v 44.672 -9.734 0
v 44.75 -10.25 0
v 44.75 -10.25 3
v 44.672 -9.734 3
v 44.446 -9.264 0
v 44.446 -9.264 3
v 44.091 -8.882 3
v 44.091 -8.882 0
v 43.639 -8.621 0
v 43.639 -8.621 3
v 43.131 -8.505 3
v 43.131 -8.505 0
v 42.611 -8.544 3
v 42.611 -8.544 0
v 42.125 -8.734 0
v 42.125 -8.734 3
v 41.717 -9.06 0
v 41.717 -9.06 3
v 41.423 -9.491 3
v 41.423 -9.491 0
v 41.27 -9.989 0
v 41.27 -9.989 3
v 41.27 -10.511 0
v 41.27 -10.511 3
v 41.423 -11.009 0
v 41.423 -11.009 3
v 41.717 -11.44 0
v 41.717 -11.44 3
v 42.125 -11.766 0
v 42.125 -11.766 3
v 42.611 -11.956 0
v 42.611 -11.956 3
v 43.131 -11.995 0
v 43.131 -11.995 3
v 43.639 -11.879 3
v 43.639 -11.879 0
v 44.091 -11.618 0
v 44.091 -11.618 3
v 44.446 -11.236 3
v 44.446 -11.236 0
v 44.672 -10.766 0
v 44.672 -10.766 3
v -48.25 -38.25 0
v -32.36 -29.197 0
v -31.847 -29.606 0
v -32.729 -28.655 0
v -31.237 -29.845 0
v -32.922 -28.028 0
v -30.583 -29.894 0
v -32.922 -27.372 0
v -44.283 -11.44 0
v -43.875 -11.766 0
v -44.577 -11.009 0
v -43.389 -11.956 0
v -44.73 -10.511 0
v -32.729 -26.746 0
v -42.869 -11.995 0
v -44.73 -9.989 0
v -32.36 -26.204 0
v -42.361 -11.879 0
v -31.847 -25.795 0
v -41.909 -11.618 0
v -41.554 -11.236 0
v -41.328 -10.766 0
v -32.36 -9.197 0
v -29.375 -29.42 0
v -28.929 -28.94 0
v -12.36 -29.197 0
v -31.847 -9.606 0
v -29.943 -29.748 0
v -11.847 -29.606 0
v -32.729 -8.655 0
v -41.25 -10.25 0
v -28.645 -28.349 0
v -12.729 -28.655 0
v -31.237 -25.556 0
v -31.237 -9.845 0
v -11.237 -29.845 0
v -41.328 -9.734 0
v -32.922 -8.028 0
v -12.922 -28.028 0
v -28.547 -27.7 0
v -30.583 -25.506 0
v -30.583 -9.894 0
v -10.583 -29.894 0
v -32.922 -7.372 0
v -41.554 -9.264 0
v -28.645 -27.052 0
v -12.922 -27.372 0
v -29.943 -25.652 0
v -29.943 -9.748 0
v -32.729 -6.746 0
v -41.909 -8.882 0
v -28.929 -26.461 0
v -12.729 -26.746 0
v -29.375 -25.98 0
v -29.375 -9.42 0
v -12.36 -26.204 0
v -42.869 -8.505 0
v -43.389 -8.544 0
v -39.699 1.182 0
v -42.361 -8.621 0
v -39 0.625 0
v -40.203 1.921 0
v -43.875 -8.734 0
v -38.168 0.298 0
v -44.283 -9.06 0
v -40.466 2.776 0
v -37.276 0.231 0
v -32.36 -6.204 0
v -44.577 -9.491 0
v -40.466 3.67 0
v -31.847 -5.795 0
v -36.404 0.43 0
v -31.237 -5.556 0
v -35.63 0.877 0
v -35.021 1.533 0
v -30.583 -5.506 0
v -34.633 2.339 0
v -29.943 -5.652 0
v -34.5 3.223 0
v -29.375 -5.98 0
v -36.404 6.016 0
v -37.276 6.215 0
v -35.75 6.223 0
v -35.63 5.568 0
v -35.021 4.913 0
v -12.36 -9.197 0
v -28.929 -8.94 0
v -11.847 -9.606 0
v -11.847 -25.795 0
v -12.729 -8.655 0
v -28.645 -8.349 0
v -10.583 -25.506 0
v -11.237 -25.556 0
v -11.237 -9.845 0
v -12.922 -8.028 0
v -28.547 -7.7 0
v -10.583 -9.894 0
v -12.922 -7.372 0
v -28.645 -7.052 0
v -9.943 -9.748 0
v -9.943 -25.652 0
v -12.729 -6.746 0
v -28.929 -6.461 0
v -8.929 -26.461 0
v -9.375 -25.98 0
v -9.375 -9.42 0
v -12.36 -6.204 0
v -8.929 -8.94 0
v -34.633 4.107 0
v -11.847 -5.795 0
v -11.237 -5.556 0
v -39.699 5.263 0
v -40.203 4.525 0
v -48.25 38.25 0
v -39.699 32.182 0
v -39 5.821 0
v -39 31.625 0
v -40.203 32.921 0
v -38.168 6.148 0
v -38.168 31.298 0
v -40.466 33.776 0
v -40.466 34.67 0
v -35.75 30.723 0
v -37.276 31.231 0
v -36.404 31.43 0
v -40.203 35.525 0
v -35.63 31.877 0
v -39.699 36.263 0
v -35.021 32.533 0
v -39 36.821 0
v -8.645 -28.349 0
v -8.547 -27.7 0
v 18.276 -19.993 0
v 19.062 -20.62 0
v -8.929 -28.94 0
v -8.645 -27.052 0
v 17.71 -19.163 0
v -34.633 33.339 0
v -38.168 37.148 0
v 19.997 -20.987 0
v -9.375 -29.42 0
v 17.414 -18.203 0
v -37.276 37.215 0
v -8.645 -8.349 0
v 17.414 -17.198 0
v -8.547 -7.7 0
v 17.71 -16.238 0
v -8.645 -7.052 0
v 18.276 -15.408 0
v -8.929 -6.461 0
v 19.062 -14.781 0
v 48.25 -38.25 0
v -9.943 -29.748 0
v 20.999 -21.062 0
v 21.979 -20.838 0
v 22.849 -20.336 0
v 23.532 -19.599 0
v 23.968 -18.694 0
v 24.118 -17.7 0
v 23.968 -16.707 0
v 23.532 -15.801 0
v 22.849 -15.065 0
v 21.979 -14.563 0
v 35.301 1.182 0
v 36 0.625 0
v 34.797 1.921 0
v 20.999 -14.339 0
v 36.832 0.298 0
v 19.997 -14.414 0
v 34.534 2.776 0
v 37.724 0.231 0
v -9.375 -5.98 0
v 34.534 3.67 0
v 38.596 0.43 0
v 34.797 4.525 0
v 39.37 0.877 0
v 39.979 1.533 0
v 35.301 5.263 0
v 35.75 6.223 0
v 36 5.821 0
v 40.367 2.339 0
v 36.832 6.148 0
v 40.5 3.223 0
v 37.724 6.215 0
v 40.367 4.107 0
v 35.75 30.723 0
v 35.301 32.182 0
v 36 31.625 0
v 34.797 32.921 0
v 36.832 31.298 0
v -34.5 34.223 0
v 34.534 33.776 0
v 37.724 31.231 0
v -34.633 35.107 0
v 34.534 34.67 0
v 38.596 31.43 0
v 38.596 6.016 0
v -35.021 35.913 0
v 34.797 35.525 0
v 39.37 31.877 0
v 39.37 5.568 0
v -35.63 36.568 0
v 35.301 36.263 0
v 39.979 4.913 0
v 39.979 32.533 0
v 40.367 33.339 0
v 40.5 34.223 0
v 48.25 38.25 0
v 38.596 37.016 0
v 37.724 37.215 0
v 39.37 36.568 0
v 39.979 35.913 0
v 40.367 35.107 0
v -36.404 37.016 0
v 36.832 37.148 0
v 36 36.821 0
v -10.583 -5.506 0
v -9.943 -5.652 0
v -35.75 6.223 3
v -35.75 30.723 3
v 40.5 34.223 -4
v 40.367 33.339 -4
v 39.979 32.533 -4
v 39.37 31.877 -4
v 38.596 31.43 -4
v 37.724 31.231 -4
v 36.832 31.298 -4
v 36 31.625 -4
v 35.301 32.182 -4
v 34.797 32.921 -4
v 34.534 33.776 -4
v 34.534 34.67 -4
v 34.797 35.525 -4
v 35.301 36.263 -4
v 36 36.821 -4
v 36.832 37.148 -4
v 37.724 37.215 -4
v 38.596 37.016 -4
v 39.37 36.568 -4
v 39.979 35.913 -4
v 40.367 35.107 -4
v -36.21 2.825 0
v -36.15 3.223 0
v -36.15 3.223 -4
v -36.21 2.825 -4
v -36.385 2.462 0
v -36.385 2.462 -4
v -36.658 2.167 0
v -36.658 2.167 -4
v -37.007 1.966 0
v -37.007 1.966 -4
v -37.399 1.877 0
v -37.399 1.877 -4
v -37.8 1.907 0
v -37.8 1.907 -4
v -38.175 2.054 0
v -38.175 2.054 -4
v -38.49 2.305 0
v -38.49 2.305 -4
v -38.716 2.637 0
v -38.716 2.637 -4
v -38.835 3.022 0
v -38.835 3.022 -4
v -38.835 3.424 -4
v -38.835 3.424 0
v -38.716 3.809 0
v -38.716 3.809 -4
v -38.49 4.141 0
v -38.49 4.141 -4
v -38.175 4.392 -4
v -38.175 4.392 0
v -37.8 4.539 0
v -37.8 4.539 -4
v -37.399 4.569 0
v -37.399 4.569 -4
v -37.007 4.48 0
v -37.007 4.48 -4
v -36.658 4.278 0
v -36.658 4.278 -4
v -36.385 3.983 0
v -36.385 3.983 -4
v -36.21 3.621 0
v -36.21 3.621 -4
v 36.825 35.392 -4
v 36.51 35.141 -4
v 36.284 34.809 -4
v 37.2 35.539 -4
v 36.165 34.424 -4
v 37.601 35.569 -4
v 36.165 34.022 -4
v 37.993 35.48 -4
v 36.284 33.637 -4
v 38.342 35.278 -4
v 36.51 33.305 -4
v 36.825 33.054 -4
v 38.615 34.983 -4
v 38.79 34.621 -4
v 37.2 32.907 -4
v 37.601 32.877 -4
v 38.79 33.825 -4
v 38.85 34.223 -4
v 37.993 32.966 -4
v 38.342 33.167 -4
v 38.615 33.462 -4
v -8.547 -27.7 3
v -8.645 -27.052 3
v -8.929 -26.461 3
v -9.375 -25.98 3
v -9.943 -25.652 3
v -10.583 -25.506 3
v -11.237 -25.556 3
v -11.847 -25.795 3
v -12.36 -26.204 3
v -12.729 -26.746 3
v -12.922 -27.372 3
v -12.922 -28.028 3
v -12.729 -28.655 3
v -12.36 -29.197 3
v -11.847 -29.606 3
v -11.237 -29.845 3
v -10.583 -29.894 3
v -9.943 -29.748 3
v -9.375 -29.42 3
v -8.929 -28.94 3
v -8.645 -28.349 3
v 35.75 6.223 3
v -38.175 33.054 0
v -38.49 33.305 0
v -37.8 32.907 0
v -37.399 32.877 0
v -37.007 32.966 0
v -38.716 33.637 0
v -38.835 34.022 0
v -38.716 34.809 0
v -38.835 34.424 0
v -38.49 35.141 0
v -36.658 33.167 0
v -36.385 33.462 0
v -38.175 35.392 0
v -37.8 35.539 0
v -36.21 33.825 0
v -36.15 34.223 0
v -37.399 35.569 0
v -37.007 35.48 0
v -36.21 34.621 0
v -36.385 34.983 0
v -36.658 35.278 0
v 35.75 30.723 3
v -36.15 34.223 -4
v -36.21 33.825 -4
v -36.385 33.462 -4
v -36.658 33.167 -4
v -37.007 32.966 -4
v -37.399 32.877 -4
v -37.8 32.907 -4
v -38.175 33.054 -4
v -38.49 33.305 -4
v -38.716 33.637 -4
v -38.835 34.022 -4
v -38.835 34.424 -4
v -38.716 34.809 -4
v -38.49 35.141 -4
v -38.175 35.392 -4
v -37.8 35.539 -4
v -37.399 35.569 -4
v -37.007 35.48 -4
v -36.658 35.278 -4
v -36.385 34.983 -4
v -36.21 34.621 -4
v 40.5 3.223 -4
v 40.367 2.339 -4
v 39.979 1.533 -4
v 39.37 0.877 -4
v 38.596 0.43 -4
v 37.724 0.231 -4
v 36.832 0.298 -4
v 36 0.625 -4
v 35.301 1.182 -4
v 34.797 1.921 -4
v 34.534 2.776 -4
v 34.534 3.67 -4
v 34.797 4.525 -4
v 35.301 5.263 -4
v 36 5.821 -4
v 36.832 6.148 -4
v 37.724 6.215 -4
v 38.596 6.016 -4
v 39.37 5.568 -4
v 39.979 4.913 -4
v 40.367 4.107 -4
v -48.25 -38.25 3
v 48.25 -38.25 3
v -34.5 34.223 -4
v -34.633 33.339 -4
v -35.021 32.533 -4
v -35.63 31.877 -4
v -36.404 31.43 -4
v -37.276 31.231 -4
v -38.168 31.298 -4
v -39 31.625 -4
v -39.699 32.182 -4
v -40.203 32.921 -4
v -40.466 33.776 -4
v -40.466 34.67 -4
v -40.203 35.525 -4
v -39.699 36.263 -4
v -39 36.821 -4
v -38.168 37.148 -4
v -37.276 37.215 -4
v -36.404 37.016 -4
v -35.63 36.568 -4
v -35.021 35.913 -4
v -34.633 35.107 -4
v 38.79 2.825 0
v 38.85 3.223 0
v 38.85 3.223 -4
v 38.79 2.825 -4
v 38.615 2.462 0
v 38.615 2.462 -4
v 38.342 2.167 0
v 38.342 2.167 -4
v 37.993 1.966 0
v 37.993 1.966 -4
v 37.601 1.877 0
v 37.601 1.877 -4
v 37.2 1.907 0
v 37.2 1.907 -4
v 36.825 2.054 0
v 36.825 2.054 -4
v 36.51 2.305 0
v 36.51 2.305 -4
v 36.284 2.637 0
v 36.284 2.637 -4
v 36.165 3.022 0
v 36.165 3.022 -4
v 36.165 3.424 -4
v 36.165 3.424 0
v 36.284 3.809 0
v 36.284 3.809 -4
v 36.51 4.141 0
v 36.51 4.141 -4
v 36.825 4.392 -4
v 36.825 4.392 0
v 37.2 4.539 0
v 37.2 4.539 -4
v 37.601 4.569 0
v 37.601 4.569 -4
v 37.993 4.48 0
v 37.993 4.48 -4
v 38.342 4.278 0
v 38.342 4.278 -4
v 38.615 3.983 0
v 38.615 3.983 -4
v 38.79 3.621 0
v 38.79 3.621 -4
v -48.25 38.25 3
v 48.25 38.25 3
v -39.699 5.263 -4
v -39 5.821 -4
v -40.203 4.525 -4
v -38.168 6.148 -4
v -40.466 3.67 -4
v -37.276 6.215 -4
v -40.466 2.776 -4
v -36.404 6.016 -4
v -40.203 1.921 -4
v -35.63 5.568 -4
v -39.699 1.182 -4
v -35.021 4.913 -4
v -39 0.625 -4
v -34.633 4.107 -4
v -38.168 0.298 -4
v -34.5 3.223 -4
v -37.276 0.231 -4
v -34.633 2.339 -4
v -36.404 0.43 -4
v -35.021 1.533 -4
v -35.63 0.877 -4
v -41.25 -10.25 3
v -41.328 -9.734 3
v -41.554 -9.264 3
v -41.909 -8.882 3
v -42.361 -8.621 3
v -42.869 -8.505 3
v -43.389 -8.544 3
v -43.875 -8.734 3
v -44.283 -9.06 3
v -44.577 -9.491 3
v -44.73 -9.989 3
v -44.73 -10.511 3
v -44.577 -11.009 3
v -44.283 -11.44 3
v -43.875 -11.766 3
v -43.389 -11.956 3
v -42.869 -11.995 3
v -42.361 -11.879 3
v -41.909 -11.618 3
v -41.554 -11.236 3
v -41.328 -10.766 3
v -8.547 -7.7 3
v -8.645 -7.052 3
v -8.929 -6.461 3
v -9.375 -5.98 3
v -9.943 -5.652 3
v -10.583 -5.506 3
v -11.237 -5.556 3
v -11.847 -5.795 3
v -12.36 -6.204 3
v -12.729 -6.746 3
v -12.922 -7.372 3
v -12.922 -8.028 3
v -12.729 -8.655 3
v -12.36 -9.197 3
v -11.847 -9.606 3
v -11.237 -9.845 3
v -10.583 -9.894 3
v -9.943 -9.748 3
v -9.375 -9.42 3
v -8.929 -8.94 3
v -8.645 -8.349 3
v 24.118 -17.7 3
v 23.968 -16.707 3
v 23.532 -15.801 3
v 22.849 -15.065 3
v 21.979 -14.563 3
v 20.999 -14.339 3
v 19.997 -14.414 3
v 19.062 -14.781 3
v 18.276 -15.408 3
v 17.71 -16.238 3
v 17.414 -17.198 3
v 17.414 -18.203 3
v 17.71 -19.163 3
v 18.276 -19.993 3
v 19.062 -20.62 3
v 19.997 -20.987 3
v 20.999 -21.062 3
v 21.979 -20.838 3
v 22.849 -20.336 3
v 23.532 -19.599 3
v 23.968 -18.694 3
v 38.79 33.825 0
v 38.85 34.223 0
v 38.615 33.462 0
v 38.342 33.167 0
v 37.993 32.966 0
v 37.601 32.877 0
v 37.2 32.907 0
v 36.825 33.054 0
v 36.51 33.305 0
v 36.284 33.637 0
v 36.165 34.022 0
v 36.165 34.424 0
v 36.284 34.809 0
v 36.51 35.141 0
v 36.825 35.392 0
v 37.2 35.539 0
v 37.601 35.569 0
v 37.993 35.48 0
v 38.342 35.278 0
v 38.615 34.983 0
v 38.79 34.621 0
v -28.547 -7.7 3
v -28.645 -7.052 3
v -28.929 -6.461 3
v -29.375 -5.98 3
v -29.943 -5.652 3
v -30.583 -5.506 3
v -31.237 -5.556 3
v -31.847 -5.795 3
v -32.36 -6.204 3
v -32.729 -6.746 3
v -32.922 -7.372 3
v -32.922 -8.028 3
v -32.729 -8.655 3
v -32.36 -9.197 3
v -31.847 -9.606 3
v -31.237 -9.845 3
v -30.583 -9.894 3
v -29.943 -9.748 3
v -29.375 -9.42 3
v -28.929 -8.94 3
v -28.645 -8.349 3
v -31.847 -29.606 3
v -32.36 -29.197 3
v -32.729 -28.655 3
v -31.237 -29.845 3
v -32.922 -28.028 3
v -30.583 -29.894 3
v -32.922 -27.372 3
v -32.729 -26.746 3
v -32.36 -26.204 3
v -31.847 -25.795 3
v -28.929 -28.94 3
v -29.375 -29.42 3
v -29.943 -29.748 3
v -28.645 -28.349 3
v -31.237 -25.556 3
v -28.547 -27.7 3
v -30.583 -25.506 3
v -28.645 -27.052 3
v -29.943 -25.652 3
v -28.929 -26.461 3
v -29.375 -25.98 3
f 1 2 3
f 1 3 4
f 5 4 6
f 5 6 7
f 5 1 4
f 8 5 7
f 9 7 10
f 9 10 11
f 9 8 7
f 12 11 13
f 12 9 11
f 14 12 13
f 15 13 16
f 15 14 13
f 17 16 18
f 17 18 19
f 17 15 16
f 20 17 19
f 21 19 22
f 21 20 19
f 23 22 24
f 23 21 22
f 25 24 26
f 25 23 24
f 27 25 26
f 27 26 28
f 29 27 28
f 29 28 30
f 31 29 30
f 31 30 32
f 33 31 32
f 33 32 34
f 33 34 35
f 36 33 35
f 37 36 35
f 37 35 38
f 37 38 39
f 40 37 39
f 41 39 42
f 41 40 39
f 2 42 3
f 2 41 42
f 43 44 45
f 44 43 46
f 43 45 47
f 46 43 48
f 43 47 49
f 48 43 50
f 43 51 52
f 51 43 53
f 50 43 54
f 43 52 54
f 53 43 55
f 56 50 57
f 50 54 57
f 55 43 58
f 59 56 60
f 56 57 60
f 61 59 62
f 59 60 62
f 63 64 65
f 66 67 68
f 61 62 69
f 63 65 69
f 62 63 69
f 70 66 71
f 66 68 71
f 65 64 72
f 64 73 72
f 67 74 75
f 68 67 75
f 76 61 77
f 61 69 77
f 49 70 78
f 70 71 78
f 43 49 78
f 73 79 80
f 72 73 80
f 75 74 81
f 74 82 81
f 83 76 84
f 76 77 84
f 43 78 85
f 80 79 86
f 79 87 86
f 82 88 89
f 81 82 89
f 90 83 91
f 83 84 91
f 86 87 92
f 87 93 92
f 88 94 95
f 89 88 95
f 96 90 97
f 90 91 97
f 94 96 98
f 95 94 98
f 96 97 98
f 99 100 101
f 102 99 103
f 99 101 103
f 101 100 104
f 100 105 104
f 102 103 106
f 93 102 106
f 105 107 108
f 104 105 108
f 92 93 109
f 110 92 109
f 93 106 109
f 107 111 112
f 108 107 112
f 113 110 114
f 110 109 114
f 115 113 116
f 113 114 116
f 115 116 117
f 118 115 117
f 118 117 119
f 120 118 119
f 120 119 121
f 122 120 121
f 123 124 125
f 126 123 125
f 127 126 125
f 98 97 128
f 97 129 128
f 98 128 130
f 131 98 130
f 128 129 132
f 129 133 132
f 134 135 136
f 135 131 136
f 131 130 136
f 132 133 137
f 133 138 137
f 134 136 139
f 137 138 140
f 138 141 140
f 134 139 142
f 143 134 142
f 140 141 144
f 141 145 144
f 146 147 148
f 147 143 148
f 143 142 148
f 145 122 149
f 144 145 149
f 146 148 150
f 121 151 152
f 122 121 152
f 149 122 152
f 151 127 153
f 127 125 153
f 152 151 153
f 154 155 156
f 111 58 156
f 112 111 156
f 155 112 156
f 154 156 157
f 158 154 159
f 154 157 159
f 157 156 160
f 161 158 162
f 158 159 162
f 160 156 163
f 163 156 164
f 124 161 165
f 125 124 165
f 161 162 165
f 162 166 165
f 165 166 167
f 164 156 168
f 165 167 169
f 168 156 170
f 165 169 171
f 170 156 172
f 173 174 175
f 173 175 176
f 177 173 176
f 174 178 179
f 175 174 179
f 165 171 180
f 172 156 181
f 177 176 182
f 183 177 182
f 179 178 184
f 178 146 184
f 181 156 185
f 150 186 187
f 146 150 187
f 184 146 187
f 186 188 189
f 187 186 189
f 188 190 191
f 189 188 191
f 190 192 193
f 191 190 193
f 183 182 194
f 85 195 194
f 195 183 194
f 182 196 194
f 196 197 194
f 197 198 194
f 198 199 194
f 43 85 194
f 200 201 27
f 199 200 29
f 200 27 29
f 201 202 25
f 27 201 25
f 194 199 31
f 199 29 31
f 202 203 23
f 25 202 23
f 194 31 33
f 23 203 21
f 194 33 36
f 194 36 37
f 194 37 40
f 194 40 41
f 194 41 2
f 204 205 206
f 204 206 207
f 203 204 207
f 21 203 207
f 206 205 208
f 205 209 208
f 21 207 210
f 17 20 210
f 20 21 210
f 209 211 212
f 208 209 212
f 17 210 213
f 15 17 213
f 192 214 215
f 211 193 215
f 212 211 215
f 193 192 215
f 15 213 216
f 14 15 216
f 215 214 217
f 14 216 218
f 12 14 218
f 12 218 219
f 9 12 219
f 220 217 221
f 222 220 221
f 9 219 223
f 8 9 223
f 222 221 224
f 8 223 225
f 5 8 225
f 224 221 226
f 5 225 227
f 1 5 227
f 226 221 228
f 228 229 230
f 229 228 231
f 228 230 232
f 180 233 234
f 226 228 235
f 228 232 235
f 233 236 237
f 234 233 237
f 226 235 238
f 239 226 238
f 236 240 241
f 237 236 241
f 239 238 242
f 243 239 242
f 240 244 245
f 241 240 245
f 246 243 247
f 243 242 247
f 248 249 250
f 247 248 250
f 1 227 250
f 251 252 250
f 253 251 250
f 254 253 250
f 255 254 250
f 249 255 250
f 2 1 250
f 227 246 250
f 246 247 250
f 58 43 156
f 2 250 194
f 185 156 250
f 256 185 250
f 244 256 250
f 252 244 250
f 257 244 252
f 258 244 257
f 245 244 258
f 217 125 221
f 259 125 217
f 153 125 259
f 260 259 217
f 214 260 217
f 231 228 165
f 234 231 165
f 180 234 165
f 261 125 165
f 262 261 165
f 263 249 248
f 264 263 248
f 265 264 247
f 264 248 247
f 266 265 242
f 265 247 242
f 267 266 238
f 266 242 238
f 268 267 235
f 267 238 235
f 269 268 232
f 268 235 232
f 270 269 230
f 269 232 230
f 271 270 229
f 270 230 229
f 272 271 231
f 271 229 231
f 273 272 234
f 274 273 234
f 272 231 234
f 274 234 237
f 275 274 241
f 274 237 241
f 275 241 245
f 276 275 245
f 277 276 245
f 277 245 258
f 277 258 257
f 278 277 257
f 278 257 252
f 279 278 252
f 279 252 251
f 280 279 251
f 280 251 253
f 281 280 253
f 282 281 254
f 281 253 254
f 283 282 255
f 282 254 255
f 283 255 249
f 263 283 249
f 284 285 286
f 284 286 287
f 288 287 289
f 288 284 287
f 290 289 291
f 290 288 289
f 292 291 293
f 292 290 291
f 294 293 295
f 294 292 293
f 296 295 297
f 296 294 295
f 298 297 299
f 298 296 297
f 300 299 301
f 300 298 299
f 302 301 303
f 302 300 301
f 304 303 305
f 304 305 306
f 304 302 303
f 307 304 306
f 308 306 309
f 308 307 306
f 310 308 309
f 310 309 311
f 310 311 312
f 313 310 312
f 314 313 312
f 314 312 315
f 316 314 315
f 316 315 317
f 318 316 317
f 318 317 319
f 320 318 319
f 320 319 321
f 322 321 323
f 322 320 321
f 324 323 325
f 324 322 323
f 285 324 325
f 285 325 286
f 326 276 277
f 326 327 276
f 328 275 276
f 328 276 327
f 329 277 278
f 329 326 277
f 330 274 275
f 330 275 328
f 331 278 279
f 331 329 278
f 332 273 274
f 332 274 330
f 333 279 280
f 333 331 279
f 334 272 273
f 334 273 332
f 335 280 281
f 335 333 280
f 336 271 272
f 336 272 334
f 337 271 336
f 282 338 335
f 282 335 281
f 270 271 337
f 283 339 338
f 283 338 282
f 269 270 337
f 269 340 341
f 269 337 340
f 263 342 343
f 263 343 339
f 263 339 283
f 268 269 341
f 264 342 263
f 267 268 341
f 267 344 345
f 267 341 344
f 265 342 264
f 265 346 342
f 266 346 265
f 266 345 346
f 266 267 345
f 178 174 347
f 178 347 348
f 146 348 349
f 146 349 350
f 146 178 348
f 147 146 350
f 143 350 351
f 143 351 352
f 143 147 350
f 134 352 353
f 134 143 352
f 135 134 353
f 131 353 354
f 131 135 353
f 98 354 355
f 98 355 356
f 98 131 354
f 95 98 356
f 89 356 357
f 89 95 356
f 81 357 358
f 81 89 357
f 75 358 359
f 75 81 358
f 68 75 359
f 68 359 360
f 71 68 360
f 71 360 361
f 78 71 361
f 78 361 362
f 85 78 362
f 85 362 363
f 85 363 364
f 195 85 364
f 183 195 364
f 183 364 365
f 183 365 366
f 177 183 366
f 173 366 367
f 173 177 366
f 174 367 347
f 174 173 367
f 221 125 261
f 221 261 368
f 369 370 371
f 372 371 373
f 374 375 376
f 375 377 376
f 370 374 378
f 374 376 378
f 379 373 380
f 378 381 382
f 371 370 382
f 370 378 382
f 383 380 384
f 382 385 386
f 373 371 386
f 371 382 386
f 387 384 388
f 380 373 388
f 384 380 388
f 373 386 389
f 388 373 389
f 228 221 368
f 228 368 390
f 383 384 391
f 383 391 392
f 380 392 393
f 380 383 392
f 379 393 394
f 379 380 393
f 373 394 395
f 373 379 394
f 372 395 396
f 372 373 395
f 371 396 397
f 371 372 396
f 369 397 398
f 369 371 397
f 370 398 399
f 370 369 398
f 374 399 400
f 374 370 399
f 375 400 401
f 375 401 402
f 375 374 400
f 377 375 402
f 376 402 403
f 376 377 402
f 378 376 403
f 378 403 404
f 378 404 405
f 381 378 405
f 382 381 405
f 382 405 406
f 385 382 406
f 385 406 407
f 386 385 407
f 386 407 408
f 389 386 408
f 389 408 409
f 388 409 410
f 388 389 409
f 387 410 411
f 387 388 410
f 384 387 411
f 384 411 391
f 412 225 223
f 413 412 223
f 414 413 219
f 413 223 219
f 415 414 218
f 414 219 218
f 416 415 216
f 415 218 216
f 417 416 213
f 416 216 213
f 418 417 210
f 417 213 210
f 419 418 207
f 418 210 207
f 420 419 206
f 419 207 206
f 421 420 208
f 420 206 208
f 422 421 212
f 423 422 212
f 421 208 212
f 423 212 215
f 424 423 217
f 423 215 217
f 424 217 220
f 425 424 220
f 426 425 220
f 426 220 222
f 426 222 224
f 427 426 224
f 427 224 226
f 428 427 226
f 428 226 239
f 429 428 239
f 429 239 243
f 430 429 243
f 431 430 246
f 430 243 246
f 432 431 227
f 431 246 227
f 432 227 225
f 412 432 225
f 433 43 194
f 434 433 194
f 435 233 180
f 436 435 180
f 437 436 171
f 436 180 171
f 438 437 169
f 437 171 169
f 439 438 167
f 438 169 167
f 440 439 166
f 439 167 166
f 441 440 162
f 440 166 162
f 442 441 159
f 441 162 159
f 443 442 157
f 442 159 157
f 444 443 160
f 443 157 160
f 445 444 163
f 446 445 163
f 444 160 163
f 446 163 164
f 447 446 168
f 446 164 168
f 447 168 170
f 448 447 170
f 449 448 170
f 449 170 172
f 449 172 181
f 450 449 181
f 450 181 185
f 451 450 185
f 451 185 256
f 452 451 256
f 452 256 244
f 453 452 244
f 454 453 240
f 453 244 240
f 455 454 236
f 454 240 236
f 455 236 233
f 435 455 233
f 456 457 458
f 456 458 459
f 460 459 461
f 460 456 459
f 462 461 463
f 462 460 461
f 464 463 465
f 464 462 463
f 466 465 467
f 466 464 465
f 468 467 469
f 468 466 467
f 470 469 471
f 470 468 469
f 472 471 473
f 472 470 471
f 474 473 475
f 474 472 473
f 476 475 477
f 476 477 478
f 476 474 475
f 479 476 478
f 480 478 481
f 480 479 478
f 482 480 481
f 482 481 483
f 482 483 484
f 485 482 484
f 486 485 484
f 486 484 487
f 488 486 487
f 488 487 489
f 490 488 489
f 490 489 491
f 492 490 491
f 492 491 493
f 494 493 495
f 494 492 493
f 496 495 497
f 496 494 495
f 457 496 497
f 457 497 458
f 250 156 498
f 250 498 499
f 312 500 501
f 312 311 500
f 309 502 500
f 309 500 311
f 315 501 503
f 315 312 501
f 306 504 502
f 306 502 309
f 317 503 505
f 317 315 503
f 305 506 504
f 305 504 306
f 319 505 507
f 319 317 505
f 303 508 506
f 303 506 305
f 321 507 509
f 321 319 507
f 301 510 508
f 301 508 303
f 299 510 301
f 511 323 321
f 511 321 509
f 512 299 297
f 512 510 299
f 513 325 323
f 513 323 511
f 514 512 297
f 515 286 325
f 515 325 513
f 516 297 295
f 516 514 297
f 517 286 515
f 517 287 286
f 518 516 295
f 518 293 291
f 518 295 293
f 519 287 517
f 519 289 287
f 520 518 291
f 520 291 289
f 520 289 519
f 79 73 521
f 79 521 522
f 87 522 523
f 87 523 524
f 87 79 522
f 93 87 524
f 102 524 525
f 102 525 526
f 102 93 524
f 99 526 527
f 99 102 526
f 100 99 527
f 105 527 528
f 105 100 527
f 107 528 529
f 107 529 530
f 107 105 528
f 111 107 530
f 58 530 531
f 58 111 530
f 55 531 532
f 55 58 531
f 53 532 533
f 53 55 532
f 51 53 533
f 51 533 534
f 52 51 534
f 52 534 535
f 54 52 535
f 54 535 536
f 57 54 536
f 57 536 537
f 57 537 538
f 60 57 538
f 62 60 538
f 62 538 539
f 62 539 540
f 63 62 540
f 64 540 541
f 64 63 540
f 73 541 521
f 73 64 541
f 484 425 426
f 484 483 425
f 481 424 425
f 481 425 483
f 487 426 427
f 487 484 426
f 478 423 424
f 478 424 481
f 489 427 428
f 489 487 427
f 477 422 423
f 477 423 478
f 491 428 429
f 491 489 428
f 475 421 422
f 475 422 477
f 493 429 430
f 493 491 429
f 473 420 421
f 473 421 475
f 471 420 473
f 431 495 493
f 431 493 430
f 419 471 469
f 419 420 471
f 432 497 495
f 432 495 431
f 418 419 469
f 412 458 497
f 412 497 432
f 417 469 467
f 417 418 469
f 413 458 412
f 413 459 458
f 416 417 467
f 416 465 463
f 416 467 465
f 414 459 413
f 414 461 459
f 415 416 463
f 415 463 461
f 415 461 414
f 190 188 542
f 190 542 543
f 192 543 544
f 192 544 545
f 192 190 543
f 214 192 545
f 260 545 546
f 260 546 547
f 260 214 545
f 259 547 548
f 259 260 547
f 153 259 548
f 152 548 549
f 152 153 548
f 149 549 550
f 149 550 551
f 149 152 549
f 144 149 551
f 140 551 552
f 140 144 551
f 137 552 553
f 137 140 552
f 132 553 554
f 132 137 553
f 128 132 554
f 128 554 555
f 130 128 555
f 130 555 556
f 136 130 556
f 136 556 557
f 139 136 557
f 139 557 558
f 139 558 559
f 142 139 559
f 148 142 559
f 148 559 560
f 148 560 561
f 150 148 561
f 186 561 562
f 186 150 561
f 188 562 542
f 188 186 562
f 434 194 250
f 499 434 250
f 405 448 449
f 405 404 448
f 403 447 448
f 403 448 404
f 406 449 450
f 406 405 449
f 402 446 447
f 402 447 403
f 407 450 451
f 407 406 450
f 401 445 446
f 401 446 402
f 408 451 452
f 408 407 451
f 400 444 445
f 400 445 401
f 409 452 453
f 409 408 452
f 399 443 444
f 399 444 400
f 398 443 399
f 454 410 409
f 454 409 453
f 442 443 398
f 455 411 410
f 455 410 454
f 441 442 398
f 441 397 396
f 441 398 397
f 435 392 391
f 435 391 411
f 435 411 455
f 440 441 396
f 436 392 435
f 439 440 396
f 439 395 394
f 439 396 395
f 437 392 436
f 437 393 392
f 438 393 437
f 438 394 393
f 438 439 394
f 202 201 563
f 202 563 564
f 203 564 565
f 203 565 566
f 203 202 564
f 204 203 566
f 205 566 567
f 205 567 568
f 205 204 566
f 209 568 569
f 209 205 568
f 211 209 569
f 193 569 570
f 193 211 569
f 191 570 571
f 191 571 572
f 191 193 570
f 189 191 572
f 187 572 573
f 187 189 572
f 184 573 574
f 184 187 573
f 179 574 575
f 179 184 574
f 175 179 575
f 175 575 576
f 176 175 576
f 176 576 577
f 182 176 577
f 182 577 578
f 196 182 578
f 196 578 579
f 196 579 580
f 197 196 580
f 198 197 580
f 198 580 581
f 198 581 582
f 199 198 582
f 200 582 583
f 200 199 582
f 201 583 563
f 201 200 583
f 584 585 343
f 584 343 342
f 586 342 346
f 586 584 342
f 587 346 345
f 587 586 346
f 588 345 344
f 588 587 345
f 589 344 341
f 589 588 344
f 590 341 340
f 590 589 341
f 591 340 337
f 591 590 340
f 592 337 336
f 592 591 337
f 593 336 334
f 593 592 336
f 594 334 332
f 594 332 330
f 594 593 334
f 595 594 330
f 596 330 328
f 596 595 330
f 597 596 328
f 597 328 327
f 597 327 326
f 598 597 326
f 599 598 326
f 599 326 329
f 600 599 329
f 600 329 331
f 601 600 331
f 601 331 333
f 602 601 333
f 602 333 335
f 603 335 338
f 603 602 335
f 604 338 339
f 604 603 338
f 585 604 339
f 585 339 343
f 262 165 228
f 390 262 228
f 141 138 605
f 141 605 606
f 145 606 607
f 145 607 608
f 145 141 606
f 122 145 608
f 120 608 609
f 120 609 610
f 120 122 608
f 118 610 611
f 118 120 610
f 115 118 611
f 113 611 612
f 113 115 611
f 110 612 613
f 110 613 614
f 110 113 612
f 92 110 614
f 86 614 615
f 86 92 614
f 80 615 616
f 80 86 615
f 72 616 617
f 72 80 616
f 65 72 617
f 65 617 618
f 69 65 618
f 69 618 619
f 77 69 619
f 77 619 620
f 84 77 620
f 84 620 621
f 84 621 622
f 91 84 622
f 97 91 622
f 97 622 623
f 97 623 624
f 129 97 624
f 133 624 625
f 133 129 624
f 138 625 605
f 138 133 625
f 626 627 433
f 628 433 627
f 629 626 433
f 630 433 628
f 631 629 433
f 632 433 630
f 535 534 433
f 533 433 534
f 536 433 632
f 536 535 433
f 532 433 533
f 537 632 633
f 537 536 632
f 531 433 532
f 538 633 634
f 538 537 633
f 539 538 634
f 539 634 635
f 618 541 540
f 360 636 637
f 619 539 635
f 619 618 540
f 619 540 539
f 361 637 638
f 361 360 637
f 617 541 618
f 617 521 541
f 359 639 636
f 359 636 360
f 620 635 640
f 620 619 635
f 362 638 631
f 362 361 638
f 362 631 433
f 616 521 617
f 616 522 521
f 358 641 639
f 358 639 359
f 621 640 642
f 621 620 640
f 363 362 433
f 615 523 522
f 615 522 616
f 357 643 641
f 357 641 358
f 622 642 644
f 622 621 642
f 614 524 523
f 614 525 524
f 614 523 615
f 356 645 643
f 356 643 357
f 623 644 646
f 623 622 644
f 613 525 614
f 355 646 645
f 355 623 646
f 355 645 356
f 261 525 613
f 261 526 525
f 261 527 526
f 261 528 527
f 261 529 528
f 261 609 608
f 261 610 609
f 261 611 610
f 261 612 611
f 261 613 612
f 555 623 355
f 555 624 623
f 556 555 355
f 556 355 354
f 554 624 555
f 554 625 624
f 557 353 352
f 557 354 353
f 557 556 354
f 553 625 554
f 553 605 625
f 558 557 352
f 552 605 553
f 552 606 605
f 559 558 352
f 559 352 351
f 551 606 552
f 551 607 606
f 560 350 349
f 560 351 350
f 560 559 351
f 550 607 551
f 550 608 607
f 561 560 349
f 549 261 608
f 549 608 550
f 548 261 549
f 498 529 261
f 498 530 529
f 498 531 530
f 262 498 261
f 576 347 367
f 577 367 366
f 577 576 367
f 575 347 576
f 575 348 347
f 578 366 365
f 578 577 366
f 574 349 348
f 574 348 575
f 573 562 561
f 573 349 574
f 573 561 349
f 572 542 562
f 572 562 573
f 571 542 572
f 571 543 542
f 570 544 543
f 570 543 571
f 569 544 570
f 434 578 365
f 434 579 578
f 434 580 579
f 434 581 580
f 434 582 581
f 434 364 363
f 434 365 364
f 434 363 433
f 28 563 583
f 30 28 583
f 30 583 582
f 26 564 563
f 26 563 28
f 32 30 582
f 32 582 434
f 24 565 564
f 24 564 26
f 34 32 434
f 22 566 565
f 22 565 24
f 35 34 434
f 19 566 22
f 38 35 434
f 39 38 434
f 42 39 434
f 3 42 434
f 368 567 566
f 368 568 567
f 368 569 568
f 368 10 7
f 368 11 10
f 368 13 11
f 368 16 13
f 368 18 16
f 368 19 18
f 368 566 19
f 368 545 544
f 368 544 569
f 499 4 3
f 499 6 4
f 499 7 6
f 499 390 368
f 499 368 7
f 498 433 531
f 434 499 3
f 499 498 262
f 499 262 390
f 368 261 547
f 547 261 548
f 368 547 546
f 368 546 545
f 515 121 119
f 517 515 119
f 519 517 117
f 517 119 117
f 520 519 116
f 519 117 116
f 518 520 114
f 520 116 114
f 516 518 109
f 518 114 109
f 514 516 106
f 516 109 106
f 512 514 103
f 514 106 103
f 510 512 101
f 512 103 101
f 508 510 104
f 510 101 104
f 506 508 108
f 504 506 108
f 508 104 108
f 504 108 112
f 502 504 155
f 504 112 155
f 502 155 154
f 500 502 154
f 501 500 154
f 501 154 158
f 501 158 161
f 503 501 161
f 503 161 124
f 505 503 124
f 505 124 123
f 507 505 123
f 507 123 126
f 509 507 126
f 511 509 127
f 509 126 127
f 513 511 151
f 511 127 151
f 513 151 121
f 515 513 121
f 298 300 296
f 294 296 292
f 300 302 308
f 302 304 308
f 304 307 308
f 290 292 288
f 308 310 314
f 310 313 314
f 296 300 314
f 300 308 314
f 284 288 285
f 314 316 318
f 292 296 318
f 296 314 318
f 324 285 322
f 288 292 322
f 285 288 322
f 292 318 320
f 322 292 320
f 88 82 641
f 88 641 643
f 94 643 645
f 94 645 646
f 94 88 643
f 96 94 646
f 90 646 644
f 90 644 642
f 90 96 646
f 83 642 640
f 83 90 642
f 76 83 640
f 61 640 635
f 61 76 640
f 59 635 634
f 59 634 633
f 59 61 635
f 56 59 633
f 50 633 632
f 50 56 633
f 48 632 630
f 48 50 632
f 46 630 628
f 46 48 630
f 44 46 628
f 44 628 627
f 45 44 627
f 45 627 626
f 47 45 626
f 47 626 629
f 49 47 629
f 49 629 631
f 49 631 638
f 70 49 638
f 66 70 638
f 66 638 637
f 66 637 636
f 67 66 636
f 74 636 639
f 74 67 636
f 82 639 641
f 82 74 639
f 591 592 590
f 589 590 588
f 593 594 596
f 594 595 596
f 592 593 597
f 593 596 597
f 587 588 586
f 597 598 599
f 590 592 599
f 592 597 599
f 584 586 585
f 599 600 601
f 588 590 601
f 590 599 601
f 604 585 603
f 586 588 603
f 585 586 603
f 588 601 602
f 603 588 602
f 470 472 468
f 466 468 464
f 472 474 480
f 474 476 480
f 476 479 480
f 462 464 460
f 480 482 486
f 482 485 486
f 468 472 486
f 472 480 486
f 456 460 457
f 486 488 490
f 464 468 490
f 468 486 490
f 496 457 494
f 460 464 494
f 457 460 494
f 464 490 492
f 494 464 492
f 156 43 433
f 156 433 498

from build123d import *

# Parameters (mm, degrees)
SKETCH_W      = 96.5
SKETCH_H      = 76.5
SKETCH_R      = 1.75
SKETCH_R_2    = 2.2
SKETCH_R_3    = 3.370836
SKETCH_W_2    = 71.5
SKETCH_H_2    = 24.5
PAD_DEPTH     = 3
SKETCH001_R   = 3
SKETCH001_R_2 = 1.35
PAD001_DEPTH  = 4


with BuildPart() as part:
    # Sketch → Pad (new body)
    with BuildSketch(Plane.XY):
        Rectangle(SKETCH_W, SKETCH_H)
        with Locations((-43, -10.25)):
            Circle(SKETCH_R, mode=Mode.SUBTRACT)
        with Locations((43, -10.25)):
            Circle(SKETCH_R, mode=Mode.SUBTRACT)
        with Locations((-30.747, -7.700343)):
            Circle(SKETCH_R_2, mode=Mode.SUBTRACT)
        with Locations((-10.747, -7.700343)):
            Circle(SKETCH_R_2, mode=Mode.SUBTRACT)
        with Locations((-30.747, -27.700343)):
            Circle(SKETCH_R_2, mode=Mode.SUBTRACT)
        with Locations((-10.747, -27.700343)):
            Circle(SKETCH_R_2, mode=Mode.SUBTRACT)
        with Locations((20.747, -17.700343)):
            Circle(SKETCH_R_3, mode=Mode.SUBTRACT)
        with Locations((0, 18.472892)):
            Rectangle(SKETCH_W_2, SKETCH_H_2, mode=Mode.SUBTRACT)
    extrude(amount=PAD_DEPTH)

    # Sketch001 (on Face16 of Pad) → Pad001 (join)
    with BuildSketch(Plane(origin=(0, 0, 0), x_dir=(1, 0, 0), z_dir=(0, 0, -1))):
        with Locations((-37.5, -3.222892)):
            Circle(SKETCH001_R)
        with Locations((-37.5, -3.222892)):
            Circle(SKETCH001_R_2, mode=Mode.SUBTRACT)
        with Locations((37.5, -3.222892)):
            Circle(SKETCH001_R)
        with Locations((37.5, -3.222892)):
            Circle(SKETCH001_R_2, mode=Mode.SUBTRACT)
        with Locations((37.5, -34.222892)):
            Circle(SKETCH001_R)
        with Locations((37.5, -34.222892)):
            Circle(SKETCH001_R_2, mode=Mode.SUBTRACT)
        with Locations((-37.5, -34.222892)):
            Circle(SKETCH001_R)
        with Locations((-37.5, -34.222892)):
            Circle(SKETCH001_R_2, mode=Mode.SUBTRACT)
    extrude(amount=PAD001_DEPTH)


solid = part.part
